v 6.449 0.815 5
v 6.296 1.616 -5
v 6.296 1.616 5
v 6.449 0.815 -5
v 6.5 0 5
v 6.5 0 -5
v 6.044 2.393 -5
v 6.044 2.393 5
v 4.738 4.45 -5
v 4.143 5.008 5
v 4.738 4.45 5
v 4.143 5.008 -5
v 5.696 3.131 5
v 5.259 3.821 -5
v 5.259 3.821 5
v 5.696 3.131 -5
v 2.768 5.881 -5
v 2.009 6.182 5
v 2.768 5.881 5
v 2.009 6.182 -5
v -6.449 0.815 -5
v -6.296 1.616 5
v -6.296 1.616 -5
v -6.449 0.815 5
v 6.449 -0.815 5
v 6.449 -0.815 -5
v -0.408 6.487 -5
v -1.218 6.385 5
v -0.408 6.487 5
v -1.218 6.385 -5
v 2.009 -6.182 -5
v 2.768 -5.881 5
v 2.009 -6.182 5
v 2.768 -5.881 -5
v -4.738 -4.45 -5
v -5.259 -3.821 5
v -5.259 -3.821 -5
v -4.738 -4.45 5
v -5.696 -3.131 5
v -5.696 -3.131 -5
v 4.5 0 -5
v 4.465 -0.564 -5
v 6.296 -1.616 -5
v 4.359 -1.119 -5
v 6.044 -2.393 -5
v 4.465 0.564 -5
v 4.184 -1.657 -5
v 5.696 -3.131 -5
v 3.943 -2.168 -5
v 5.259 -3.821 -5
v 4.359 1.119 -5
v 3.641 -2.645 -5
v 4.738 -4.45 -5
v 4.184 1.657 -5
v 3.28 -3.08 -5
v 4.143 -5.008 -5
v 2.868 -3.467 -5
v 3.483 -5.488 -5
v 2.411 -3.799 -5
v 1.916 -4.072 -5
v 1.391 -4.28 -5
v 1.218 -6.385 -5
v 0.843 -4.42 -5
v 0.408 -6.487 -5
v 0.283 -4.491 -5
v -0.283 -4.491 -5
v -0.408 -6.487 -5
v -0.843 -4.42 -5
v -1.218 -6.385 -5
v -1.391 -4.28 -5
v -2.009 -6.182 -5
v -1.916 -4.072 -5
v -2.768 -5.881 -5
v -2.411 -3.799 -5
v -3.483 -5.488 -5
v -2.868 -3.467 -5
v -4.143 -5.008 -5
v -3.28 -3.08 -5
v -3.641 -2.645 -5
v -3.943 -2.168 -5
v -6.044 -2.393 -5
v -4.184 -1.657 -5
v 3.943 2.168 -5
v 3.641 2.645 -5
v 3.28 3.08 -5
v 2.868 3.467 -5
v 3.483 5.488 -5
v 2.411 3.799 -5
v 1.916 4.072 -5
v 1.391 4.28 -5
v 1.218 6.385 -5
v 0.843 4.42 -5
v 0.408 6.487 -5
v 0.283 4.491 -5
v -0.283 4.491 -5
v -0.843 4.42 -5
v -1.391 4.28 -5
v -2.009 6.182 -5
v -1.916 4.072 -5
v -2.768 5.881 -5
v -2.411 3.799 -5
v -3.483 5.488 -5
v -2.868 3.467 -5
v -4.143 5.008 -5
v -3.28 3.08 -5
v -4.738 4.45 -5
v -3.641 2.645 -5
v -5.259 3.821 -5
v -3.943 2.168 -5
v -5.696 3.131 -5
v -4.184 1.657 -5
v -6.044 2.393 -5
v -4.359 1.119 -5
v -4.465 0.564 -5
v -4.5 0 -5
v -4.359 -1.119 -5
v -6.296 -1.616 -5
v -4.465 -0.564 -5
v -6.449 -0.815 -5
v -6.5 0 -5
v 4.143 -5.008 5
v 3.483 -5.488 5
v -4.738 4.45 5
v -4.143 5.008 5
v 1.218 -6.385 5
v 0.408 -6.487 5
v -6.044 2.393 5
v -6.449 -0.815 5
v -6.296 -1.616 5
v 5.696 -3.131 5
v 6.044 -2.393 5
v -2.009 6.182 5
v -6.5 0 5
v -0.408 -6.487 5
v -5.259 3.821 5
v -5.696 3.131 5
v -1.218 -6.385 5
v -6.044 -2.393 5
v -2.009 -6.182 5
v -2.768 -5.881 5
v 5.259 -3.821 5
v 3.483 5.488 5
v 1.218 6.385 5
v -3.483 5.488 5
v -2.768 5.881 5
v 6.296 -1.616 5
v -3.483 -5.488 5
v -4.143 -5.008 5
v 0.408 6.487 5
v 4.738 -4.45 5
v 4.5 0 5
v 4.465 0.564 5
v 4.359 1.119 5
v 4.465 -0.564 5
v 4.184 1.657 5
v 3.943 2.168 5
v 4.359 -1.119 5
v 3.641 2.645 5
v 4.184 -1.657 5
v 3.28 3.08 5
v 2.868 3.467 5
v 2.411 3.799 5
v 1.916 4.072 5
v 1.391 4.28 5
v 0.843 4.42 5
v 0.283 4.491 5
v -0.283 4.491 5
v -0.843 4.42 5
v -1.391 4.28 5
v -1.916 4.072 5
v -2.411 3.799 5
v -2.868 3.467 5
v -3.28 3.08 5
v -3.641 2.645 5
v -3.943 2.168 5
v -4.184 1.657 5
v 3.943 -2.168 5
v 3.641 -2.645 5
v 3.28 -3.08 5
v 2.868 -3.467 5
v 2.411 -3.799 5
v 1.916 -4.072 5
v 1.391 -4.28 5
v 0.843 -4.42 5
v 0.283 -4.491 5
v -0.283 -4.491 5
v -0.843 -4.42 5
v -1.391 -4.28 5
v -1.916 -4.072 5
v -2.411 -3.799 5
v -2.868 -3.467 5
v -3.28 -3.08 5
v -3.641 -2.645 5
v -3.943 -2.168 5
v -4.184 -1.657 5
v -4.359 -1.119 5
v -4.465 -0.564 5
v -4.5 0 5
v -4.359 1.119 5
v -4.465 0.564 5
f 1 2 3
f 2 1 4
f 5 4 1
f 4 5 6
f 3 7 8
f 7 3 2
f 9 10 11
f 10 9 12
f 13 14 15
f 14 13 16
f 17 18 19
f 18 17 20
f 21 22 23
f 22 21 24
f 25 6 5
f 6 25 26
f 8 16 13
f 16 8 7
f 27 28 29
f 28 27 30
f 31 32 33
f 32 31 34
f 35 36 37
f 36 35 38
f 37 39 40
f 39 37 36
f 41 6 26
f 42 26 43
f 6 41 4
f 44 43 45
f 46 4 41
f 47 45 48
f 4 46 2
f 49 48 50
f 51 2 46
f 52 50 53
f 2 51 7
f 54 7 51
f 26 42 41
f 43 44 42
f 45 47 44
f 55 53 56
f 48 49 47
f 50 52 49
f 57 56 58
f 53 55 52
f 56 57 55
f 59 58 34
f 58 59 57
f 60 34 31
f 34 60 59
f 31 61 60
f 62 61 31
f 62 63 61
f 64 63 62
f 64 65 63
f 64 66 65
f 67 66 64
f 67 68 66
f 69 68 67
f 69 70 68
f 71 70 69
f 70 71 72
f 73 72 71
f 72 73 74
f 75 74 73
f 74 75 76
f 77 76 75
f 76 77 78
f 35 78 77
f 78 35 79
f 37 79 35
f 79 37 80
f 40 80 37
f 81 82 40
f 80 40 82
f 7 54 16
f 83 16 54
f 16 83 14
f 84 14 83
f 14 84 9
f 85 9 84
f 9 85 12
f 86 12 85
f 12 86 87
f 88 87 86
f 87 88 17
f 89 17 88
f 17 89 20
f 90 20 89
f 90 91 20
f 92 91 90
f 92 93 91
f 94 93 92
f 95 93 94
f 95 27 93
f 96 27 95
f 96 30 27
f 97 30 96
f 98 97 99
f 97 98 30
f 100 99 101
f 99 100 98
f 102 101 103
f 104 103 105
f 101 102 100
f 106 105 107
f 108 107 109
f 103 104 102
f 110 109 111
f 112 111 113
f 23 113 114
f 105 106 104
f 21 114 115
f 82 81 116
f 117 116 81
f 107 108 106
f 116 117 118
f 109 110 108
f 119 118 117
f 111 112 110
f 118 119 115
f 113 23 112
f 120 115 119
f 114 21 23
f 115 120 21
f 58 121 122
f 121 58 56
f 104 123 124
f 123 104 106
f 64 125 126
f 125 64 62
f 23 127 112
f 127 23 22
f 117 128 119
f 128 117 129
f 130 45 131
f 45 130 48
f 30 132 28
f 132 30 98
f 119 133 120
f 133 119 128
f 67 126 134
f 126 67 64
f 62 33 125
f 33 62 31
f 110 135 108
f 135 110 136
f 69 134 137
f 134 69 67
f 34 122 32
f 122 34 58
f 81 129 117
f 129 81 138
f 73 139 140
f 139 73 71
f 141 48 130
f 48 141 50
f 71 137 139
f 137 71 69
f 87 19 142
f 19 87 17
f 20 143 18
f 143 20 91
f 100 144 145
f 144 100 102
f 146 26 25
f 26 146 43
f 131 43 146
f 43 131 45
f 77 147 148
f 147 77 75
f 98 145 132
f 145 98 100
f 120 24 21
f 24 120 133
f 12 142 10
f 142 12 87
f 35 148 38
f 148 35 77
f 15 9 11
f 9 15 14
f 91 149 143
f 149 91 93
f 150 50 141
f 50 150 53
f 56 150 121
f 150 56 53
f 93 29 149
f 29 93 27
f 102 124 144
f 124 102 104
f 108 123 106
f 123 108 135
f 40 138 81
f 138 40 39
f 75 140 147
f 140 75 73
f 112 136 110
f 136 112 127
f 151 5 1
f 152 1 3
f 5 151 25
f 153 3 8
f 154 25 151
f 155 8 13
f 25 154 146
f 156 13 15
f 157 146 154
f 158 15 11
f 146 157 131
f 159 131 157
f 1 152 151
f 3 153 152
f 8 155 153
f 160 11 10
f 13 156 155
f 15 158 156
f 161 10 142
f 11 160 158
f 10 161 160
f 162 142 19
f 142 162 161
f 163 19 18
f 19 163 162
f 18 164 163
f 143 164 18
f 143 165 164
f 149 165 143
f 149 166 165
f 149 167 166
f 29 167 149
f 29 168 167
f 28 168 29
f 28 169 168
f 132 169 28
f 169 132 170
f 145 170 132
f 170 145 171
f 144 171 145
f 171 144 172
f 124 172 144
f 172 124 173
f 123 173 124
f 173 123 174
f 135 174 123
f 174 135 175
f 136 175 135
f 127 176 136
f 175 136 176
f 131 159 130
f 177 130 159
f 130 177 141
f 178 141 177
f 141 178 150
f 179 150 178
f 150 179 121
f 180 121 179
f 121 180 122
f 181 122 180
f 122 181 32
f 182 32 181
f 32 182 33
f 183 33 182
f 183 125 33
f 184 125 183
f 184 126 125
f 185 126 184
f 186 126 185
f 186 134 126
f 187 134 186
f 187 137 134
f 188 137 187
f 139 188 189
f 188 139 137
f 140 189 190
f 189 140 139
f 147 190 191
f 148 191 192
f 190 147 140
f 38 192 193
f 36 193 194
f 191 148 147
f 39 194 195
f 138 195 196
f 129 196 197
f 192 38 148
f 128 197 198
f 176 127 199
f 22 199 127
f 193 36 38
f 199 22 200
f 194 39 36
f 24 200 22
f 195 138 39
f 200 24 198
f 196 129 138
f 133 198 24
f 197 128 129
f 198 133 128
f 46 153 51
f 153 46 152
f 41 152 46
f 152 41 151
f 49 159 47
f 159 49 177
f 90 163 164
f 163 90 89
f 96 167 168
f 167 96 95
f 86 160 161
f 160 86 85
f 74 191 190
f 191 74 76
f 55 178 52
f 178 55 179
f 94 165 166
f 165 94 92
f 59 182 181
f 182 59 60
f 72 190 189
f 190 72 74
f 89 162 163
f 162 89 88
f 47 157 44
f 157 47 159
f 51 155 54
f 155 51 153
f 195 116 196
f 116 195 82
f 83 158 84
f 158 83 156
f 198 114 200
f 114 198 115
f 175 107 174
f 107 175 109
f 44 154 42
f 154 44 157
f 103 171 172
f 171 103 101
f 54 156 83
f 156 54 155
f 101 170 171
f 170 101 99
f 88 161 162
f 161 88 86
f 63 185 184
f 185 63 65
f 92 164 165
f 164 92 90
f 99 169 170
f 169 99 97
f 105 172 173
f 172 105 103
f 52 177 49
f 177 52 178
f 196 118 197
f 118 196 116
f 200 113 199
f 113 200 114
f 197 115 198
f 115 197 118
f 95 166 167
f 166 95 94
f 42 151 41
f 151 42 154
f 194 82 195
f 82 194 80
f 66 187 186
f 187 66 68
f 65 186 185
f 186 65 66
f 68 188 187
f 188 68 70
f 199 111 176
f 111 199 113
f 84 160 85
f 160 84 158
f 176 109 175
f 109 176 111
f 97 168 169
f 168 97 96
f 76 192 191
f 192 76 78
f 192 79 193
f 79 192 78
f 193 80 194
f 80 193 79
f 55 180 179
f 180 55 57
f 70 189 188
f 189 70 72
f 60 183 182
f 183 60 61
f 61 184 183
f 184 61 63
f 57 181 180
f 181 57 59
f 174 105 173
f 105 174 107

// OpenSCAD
$fn = 50;


difference() {
	union() {
		translate(v = [0, 0, -5.0000000000]) {
			cylinder(h = 10, r = 6.5000000000);
		}
	}
	union() {
		translate(v = [0, 0, -100.0000000000]) {
			cylinder(h = 200, r = 4.5000000000);
		}
	}
}
